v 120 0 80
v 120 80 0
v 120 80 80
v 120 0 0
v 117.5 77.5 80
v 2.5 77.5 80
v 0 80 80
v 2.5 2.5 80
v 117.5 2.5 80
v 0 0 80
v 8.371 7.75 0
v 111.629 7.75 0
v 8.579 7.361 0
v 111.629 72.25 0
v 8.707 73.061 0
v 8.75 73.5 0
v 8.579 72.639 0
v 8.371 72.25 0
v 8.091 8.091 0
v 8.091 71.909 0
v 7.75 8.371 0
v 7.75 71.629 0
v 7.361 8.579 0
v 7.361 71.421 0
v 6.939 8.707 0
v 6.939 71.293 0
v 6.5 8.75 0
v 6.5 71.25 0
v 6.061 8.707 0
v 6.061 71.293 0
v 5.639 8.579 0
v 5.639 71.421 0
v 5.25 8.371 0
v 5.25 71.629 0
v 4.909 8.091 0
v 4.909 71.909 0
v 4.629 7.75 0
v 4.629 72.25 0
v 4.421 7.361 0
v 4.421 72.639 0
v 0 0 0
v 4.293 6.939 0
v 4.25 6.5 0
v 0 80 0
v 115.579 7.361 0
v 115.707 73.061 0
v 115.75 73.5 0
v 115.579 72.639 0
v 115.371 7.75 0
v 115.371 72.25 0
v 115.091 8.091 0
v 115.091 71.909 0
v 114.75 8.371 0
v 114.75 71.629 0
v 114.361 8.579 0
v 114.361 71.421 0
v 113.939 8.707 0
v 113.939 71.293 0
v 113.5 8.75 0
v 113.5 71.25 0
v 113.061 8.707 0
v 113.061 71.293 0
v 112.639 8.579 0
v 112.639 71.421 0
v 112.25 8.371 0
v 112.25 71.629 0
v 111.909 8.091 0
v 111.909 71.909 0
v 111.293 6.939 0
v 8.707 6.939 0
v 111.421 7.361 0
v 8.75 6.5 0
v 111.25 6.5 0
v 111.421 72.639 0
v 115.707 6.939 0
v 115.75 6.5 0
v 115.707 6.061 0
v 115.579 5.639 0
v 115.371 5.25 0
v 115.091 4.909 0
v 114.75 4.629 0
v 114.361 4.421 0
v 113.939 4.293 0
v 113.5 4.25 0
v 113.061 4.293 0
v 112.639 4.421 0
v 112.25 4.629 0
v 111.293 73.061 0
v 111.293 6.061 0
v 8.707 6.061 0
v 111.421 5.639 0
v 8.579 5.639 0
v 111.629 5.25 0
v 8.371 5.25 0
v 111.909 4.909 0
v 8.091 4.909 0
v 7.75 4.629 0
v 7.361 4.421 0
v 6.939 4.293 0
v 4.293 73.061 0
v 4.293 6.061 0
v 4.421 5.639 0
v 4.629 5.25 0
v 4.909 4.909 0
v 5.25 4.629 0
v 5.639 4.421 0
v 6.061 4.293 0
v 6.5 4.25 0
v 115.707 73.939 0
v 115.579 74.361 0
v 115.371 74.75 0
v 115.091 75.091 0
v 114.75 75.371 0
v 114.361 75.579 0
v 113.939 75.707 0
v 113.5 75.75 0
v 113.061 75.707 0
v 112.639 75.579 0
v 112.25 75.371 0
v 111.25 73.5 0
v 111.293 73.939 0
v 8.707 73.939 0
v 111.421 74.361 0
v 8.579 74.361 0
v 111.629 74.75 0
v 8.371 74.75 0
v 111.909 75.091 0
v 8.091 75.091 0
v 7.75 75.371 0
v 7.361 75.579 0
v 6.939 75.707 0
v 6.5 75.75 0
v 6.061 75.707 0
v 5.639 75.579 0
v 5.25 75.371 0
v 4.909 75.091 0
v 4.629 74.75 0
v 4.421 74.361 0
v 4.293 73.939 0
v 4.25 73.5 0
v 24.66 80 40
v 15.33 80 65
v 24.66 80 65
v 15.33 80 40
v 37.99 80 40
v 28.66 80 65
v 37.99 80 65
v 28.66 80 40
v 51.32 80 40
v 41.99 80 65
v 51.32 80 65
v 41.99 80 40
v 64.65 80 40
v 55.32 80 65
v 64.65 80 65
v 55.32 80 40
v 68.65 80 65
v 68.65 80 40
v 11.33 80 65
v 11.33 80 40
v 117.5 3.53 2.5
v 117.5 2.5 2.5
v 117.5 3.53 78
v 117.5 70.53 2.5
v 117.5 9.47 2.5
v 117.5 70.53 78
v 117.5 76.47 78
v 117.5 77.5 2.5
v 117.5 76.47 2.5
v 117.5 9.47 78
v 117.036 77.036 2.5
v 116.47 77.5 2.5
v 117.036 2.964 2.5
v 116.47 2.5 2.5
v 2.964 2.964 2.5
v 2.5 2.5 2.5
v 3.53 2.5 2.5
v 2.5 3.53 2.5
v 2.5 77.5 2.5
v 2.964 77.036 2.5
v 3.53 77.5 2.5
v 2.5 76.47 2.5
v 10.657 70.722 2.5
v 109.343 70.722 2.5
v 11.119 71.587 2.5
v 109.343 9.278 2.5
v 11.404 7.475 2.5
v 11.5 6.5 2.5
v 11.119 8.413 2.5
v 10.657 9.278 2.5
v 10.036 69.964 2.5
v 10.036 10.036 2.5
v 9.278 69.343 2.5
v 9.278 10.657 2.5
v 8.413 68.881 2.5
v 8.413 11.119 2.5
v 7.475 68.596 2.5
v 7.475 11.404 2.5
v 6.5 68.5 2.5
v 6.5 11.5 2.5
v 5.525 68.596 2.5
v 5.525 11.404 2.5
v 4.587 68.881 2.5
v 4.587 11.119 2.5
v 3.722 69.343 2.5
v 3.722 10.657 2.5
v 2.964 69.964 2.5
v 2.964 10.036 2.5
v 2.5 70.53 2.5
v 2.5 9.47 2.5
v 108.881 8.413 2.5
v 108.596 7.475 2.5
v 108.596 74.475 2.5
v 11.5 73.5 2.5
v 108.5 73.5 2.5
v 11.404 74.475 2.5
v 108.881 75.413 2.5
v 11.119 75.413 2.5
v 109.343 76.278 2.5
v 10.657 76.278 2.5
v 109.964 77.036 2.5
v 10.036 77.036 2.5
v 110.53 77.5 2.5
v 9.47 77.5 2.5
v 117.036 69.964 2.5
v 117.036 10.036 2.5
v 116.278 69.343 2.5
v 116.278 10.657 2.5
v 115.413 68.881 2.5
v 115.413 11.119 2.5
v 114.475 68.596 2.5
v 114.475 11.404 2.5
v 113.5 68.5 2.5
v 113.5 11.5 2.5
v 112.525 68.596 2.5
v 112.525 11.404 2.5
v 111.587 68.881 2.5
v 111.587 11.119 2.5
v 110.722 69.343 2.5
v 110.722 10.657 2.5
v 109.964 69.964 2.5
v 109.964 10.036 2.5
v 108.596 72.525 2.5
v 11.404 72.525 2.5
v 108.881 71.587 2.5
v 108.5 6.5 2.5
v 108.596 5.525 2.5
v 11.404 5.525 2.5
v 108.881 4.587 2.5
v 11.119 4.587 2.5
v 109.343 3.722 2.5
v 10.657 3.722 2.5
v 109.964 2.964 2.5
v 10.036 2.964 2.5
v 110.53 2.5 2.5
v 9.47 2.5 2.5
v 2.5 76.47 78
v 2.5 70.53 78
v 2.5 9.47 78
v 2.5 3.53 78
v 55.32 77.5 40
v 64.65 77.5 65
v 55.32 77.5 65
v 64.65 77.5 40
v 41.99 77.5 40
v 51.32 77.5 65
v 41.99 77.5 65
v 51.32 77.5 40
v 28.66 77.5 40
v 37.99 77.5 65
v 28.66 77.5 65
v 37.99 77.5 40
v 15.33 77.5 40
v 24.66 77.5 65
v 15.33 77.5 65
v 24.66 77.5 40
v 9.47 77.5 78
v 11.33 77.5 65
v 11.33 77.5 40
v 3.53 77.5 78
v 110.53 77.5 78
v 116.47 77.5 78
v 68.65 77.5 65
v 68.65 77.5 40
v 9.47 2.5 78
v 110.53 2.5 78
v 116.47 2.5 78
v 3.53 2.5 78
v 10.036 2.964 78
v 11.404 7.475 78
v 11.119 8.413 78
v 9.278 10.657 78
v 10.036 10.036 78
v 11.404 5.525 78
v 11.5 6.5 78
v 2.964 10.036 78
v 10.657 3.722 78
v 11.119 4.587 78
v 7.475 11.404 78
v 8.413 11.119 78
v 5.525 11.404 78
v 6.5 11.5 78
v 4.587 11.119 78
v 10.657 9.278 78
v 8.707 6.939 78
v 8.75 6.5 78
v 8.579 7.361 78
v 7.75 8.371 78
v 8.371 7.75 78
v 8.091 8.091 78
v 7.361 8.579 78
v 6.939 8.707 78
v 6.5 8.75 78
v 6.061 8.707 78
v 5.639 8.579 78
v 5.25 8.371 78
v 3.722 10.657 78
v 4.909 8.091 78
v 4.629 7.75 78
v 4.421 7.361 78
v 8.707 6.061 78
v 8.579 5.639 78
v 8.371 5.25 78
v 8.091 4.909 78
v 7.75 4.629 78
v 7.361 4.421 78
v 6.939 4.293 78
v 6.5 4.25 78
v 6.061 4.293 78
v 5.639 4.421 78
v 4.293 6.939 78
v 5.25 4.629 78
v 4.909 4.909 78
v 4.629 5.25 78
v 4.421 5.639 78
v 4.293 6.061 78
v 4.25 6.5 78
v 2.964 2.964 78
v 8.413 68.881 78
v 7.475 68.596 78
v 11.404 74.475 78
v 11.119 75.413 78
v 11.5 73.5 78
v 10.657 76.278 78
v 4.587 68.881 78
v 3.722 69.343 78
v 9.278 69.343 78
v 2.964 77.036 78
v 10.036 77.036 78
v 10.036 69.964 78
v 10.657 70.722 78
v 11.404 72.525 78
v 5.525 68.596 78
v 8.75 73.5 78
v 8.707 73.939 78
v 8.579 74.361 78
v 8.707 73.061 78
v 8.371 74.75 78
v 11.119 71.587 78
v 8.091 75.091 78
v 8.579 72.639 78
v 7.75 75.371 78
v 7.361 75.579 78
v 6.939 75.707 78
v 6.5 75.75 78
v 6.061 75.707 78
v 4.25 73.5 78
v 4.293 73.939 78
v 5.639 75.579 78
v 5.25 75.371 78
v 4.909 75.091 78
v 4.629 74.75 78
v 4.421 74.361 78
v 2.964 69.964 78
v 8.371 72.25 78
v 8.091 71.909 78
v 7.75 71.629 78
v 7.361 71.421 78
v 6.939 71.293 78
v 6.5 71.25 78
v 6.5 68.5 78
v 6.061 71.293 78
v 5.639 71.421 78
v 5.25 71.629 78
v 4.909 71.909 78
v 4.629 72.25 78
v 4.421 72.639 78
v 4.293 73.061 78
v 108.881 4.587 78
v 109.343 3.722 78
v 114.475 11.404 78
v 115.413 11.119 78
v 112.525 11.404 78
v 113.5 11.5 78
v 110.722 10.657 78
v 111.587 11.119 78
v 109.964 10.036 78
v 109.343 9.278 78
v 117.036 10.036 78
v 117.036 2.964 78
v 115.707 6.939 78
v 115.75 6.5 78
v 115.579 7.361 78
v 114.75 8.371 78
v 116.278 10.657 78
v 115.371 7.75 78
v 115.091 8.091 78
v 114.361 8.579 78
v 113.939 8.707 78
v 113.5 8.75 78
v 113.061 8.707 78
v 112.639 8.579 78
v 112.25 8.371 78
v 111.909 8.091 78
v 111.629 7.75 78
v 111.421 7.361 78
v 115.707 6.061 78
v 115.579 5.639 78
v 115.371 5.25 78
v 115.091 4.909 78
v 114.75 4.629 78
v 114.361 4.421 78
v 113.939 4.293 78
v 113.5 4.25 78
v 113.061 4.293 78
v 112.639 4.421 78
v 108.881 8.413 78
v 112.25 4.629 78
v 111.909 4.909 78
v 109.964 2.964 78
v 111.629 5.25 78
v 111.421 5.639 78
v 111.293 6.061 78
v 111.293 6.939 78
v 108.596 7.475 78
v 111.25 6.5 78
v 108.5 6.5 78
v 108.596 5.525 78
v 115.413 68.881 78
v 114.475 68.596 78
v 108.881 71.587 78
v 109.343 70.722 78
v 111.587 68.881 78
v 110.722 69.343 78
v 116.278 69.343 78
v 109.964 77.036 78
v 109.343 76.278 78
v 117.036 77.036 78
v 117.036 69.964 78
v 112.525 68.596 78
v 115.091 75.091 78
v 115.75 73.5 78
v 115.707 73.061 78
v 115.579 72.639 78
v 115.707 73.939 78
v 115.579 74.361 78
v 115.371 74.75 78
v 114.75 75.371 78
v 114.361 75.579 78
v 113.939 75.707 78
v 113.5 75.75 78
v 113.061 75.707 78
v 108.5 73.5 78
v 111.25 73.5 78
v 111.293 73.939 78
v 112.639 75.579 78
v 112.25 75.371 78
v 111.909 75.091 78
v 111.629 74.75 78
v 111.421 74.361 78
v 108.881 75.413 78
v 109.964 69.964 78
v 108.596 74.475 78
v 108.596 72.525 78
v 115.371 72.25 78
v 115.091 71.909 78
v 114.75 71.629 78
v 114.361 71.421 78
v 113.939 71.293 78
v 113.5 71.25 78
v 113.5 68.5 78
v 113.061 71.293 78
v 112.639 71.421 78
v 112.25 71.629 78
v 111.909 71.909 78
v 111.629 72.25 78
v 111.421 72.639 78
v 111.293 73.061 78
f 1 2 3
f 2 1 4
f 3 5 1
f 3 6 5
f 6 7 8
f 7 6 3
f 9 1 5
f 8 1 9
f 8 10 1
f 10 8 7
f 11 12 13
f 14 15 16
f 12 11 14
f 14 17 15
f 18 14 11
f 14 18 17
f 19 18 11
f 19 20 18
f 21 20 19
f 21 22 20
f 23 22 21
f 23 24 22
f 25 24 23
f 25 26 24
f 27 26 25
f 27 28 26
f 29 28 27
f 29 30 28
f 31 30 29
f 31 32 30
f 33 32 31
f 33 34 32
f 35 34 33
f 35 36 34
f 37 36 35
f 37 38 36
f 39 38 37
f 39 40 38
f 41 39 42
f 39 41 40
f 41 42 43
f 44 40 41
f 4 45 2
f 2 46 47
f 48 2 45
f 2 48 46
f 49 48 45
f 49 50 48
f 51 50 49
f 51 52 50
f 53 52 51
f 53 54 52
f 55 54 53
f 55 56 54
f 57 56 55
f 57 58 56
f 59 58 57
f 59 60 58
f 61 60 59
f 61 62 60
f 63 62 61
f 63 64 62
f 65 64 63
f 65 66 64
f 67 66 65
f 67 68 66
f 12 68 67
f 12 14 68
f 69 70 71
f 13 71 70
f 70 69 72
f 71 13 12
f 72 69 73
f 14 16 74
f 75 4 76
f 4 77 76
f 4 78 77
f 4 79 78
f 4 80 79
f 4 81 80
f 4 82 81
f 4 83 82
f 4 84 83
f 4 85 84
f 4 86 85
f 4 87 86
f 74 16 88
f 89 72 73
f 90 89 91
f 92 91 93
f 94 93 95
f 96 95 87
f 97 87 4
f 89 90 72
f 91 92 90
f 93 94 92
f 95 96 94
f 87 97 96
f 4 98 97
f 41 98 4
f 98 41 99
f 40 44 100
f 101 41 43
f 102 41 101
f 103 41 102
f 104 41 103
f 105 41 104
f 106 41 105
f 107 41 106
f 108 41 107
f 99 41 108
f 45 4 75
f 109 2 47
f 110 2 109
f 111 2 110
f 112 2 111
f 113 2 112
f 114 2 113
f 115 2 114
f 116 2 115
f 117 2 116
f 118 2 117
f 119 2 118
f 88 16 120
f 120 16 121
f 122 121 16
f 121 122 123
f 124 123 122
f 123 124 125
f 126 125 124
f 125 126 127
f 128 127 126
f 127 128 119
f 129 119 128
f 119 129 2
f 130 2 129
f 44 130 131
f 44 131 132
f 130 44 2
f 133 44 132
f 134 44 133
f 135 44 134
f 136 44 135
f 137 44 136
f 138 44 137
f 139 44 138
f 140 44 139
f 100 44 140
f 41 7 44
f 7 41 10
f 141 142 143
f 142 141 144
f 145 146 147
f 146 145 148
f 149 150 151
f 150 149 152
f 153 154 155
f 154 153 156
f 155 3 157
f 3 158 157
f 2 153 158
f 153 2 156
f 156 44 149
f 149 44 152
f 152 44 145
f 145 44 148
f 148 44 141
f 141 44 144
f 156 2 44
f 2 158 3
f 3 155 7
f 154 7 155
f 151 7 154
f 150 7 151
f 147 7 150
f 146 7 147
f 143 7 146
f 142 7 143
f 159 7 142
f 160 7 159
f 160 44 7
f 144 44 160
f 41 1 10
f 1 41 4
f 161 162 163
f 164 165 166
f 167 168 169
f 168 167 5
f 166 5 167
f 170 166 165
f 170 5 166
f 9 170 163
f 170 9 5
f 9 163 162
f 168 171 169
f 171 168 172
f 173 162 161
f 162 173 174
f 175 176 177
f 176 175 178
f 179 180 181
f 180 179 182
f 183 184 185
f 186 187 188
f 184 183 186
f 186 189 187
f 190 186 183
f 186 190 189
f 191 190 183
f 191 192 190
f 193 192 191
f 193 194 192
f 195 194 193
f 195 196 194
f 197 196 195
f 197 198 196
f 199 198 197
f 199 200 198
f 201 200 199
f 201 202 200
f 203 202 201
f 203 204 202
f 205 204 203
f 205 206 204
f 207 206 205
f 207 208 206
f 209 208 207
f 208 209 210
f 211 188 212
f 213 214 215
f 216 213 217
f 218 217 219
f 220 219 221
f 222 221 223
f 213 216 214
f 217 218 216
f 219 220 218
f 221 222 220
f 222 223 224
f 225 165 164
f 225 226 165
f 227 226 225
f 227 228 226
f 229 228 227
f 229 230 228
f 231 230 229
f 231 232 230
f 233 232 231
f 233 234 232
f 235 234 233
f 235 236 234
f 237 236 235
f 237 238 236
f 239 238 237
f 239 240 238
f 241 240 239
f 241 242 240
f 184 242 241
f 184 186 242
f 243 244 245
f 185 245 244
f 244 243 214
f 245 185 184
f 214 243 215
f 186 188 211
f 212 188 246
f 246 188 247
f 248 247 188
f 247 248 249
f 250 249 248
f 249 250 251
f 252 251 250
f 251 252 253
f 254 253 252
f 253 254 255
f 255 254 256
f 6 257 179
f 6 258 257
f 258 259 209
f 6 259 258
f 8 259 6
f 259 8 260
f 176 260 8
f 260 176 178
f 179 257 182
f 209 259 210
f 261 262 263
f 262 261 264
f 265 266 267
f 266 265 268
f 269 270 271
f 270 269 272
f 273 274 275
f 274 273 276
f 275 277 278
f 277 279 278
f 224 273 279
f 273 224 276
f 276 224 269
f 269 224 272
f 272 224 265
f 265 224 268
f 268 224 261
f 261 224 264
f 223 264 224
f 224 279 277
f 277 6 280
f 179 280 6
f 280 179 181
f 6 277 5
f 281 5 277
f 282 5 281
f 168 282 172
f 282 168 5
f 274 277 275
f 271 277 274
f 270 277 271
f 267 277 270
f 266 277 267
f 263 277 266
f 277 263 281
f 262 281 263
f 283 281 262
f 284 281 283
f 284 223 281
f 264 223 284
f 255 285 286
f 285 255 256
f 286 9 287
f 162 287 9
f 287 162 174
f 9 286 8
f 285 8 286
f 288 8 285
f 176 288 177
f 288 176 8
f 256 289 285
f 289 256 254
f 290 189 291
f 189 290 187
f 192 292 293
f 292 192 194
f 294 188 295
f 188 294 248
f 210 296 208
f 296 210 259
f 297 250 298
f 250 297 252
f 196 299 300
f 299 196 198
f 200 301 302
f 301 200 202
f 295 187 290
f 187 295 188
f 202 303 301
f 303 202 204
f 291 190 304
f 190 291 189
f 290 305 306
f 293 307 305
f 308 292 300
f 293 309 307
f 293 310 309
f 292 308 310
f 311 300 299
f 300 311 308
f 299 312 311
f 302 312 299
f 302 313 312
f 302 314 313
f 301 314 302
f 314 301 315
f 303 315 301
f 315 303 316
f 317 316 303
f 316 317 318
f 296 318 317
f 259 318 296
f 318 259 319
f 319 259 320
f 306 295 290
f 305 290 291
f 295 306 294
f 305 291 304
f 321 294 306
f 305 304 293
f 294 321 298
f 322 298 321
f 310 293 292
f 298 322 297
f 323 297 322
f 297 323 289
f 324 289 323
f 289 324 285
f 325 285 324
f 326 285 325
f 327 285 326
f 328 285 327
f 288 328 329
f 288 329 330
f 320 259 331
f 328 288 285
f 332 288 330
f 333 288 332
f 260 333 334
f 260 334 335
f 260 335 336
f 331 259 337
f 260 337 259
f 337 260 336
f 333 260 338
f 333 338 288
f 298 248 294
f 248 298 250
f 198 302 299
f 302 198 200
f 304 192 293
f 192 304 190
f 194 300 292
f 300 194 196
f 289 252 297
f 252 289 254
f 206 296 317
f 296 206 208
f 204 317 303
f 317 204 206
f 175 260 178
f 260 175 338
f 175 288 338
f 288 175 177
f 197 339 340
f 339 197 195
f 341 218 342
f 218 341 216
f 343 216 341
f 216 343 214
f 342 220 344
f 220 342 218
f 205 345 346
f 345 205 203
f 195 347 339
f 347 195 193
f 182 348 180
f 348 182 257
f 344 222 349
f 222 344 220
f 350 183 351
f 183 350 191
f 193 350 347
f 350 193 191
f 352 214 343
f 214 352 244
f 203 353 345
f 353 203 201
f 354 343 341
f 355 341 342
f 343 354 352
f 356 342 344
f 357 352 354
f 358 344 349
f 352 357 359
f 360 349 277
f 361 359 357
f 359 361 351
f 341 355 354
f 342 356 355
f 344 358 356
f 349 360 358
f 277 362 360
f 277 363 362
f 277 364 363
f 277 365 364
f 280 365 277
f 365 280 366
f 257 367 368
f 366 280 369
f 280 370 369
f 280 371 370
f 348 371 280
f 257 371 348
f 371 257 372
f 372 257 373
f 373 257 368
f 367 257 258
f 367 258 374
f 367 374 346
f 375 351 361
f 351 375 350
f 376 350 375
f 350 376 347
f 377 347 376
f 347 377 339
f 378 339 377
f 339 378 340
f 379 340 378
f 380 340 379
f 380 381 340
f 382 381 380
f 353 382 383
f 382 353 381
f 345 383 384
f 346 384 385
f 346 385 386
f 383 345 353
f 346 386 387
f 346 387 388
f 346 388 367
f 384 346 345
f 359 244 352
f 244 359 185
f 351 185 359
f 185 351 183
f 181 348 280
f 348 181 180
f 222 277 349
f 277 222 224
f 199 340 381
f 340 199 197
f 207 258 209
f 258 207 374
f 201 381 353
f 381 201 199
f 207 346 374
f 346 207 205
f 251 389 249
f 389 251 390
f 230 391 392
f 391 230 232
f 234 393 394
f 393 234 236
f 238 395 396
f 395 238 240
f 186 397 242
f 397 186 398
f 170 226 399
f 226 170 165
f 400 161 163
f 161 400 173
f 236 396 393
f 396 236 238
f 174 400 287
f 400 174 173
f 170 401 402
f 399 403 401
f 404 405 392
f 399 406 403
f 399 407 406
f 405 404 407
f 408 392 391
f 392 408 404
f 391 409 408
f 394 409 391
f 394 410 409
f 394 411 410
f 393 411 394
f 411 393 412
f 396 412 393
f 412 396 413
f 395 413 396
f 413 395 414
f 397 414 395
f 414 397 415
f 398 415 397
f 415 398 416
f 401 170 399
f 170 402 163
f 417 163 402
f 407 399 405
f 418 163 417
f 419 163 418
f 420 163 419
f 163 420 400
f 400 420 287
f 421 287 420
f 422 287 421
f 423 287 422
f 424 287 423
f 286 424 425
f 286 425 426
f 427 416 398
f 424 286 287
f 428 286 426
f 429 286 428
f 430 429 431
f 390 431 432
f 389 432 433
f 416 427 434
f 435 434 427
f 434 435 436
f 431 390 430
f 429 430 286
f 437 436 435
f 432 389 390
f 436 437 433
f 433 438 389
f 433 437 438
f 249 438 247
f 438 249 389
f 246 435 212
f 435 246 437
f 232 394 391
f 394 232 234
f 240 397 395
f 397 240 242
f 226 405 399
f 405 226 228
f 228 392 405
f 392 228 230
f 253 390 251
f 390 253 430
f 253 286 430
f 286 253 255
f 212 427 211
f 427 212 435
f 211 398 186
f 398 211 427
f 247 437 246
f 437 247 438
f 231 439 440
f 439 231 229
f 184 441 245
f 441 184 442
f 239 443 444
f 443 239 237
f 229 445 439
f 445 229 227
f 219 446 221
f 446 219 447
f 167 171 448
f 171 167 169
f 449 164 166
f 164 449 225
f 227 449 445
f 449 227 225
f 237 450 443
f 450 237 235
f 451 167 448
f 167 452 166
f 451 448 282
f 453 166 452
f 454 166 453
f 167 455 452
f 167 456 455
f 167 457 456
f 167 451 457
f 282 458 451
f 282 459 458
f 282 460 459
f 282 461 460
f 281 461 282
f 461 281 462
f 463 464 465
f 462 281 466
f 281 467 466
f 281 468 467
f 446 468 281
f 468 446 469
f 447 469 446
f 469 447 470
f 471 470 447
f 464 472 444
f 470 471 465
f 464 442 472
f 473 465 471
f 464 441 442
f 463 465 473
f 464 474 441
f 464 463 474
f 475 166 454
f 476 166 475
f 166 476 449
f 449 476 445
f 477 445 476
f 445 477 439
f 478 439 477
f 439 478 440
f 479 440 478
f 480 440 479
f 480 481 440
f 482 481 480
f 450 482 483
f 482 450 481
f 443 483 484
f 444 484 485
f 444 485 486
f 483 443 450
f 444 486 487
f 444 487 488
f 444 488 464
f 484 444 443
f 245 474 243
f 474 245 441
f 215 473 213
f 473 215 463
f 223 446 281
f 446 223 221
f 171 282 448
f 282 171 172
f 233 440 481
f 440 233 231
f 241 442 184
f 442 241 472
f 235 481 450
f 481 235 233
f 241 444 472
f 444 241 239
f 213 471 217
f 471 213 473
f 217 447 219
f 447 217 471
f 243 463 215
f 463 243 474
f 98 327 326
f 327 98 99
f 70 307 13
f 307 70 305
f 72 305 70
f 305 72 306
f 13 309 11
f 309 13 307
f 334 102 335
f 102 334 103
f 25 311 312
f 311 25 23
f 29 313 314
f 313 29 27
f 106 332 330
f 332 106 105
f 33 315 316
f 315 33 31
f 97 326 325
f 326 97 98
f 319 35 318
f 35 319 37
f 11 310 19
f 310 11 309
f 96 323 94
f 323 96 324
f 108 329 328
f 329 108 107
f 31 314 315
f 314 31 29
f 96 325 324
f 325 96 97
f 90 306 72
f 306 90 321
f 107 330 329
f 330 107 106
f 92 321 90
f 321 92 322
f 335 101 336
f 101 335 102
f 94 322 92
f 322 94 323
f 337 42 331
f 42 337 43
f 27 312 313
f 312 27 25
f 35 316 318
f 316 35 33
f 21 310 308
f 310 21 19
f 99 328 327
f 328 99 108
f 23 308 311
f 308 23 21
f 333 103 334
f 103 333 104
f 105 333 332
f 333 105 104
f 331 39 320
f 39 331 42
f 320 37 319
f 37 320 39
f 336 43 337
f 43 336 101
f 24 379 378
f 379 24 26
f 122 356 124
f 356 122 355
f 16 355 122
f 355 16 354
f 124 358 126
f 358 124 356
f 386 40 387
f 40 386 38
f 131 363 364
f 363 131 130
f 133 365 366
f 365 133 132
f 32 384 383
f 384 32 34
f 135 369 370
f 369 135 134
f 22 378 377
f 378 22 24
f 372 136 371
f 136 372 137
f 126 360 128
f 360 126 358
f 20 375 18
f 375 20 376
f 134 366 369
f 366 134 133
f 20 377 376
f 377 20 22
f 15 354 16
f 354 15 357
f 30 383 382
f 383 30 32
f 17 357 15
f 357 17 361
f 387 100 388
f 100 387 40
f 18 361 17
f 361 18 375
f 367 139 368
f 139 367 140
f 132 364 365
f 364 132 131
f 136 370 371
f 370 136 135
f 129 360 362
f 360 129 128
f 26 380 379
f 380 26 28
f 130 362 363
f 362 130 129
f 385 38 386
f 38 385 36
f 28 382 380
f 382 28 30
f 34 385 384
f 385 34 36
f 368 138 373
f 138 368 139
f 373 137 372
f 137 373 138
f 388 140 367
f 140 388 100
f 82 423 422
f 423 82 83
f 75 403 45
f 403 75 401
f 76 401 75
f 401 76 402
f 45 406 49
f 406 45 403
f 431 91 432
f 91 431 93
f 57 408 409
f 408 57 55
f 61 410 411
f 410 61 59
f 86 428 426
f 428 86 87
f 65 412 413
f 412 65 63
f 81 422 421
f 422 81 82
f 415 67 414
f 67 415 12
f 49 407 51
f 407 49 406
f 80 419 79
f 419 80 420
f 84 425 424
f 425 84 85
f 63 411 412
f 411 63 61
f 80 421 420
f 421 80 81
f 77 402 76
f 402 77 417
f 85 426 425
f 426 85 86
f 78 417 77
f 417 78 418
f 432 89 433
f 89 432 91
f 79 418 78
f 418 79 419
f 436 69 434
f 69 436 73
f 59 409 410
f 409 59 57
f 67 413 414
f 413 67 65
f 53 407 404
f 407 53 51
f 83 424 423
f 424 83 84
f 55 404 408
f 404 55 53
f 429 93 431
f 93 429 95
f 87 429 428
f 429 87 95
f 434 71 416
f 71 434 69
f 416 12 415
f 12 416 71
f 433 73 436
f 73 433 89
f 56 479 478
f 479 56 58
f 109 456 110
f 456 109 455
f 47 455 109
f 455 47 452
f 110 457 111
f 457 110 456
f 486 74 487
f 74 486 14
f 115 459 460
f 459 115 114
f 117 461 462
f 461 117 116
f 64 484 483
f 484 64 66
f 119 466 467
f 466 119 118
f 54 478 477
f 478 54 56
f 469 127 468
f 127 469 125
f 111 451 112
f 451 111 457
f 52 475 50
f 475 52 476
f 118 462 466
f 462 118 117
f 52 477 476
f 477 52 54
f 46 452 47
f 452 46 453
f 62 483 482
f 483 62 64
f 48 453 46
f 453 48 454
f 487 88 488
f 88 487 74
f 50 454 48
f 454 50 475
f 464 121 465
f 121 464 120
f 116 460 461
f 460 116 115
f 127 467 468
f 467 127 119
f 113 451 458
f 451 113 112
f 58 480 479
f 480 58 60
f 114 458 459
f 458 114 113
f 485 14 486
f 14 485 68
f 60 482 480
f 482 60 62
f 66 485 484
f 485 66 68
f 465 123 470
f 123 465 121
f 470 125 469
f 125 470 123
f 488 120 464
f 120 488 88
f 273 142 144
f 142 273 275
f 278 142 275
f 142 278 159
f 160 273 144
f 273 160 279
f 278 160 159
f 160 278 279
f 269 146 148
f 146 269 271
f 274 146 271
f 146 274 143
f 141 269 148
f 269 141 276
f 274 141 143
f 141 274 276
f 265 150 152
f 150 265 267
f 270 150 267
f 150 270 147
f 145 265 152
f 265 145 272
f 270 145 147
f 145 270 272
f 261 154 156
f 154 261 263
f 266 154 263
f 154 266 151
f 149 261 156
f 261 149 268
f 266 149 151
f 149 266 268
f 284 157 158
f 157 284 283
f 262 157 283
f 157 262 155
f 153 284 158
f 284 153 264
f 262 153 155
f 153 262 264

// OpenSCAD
$fn = 32;

// ----------------------------------------------------------------------
// Enclosure body: 120 x 80 x 80 mm, wall 2.5 mm
// ----------------------------------------------------------------------

// --- parameters (mm) ---
length = 120;             // outside length, X
width = 80;               // outside width, Y
height = 80;              // outside height, Z
wall = 2.5;               // side wall thickness
floor_t = 2.5;            // floor thickness
boss_d = 10;              // corner boss diameter
boss_h = 75.5;            // corner boss height above the floor
boss_hole_d = 4.5;        // lid screw clearance in the boss
boss_lip = 6.5;           // boss centre inset from the corner
vent_slots = 5;           // vent slots in the long wall
vent_w = 4;               // vent slot width
vent_h = 25;              // vent slot height
vent_pitch = 13.33;       // vent slot pitch
vent_z = 40;              // vent slot sill height

module shell() {
  difference() {
    cube([length, width, height]);
    /* hollow, open at the top */
    translate([wall, wall, floor_t])
      cube([length - 2 * wall, width - 2 * wall, height]);
  }
}

module bosses() {
  /* corner bosses, sunk 1 mm into the floor */
  for (sx = [0, 1]) for (sy = [0, 1])
    translate([sx * (length - 2 * boss_lip) + boss_lip, sy * (width - 2 * boss_lip) + boss_lip, floor_t - 1])
      cylinder(h = boss_h + 1, d = boss_d);
}

difference() {
  union() {
    shell();
    bosses();
  }
  /* boss screw holes */
  for (sx = [0, 1]) for (sy = [0, 1])
    translate([sx * (length - 2 * boss_lip) + boss_lip, sy * (width - 2 * boss_lip) + boss_lip, -1]) cylinder(h = floor_t + boss_h + 2, d = boss_hole_d);
  /* vent grille in the +Y wall */
  for (i = [0 : vent_slots - 1]) translate([vent_pitch * (i + 1) - vent_w / 2, width - wall - 1, vent_z]) cube([vent_w, wall + 2, vent_h]);
}
